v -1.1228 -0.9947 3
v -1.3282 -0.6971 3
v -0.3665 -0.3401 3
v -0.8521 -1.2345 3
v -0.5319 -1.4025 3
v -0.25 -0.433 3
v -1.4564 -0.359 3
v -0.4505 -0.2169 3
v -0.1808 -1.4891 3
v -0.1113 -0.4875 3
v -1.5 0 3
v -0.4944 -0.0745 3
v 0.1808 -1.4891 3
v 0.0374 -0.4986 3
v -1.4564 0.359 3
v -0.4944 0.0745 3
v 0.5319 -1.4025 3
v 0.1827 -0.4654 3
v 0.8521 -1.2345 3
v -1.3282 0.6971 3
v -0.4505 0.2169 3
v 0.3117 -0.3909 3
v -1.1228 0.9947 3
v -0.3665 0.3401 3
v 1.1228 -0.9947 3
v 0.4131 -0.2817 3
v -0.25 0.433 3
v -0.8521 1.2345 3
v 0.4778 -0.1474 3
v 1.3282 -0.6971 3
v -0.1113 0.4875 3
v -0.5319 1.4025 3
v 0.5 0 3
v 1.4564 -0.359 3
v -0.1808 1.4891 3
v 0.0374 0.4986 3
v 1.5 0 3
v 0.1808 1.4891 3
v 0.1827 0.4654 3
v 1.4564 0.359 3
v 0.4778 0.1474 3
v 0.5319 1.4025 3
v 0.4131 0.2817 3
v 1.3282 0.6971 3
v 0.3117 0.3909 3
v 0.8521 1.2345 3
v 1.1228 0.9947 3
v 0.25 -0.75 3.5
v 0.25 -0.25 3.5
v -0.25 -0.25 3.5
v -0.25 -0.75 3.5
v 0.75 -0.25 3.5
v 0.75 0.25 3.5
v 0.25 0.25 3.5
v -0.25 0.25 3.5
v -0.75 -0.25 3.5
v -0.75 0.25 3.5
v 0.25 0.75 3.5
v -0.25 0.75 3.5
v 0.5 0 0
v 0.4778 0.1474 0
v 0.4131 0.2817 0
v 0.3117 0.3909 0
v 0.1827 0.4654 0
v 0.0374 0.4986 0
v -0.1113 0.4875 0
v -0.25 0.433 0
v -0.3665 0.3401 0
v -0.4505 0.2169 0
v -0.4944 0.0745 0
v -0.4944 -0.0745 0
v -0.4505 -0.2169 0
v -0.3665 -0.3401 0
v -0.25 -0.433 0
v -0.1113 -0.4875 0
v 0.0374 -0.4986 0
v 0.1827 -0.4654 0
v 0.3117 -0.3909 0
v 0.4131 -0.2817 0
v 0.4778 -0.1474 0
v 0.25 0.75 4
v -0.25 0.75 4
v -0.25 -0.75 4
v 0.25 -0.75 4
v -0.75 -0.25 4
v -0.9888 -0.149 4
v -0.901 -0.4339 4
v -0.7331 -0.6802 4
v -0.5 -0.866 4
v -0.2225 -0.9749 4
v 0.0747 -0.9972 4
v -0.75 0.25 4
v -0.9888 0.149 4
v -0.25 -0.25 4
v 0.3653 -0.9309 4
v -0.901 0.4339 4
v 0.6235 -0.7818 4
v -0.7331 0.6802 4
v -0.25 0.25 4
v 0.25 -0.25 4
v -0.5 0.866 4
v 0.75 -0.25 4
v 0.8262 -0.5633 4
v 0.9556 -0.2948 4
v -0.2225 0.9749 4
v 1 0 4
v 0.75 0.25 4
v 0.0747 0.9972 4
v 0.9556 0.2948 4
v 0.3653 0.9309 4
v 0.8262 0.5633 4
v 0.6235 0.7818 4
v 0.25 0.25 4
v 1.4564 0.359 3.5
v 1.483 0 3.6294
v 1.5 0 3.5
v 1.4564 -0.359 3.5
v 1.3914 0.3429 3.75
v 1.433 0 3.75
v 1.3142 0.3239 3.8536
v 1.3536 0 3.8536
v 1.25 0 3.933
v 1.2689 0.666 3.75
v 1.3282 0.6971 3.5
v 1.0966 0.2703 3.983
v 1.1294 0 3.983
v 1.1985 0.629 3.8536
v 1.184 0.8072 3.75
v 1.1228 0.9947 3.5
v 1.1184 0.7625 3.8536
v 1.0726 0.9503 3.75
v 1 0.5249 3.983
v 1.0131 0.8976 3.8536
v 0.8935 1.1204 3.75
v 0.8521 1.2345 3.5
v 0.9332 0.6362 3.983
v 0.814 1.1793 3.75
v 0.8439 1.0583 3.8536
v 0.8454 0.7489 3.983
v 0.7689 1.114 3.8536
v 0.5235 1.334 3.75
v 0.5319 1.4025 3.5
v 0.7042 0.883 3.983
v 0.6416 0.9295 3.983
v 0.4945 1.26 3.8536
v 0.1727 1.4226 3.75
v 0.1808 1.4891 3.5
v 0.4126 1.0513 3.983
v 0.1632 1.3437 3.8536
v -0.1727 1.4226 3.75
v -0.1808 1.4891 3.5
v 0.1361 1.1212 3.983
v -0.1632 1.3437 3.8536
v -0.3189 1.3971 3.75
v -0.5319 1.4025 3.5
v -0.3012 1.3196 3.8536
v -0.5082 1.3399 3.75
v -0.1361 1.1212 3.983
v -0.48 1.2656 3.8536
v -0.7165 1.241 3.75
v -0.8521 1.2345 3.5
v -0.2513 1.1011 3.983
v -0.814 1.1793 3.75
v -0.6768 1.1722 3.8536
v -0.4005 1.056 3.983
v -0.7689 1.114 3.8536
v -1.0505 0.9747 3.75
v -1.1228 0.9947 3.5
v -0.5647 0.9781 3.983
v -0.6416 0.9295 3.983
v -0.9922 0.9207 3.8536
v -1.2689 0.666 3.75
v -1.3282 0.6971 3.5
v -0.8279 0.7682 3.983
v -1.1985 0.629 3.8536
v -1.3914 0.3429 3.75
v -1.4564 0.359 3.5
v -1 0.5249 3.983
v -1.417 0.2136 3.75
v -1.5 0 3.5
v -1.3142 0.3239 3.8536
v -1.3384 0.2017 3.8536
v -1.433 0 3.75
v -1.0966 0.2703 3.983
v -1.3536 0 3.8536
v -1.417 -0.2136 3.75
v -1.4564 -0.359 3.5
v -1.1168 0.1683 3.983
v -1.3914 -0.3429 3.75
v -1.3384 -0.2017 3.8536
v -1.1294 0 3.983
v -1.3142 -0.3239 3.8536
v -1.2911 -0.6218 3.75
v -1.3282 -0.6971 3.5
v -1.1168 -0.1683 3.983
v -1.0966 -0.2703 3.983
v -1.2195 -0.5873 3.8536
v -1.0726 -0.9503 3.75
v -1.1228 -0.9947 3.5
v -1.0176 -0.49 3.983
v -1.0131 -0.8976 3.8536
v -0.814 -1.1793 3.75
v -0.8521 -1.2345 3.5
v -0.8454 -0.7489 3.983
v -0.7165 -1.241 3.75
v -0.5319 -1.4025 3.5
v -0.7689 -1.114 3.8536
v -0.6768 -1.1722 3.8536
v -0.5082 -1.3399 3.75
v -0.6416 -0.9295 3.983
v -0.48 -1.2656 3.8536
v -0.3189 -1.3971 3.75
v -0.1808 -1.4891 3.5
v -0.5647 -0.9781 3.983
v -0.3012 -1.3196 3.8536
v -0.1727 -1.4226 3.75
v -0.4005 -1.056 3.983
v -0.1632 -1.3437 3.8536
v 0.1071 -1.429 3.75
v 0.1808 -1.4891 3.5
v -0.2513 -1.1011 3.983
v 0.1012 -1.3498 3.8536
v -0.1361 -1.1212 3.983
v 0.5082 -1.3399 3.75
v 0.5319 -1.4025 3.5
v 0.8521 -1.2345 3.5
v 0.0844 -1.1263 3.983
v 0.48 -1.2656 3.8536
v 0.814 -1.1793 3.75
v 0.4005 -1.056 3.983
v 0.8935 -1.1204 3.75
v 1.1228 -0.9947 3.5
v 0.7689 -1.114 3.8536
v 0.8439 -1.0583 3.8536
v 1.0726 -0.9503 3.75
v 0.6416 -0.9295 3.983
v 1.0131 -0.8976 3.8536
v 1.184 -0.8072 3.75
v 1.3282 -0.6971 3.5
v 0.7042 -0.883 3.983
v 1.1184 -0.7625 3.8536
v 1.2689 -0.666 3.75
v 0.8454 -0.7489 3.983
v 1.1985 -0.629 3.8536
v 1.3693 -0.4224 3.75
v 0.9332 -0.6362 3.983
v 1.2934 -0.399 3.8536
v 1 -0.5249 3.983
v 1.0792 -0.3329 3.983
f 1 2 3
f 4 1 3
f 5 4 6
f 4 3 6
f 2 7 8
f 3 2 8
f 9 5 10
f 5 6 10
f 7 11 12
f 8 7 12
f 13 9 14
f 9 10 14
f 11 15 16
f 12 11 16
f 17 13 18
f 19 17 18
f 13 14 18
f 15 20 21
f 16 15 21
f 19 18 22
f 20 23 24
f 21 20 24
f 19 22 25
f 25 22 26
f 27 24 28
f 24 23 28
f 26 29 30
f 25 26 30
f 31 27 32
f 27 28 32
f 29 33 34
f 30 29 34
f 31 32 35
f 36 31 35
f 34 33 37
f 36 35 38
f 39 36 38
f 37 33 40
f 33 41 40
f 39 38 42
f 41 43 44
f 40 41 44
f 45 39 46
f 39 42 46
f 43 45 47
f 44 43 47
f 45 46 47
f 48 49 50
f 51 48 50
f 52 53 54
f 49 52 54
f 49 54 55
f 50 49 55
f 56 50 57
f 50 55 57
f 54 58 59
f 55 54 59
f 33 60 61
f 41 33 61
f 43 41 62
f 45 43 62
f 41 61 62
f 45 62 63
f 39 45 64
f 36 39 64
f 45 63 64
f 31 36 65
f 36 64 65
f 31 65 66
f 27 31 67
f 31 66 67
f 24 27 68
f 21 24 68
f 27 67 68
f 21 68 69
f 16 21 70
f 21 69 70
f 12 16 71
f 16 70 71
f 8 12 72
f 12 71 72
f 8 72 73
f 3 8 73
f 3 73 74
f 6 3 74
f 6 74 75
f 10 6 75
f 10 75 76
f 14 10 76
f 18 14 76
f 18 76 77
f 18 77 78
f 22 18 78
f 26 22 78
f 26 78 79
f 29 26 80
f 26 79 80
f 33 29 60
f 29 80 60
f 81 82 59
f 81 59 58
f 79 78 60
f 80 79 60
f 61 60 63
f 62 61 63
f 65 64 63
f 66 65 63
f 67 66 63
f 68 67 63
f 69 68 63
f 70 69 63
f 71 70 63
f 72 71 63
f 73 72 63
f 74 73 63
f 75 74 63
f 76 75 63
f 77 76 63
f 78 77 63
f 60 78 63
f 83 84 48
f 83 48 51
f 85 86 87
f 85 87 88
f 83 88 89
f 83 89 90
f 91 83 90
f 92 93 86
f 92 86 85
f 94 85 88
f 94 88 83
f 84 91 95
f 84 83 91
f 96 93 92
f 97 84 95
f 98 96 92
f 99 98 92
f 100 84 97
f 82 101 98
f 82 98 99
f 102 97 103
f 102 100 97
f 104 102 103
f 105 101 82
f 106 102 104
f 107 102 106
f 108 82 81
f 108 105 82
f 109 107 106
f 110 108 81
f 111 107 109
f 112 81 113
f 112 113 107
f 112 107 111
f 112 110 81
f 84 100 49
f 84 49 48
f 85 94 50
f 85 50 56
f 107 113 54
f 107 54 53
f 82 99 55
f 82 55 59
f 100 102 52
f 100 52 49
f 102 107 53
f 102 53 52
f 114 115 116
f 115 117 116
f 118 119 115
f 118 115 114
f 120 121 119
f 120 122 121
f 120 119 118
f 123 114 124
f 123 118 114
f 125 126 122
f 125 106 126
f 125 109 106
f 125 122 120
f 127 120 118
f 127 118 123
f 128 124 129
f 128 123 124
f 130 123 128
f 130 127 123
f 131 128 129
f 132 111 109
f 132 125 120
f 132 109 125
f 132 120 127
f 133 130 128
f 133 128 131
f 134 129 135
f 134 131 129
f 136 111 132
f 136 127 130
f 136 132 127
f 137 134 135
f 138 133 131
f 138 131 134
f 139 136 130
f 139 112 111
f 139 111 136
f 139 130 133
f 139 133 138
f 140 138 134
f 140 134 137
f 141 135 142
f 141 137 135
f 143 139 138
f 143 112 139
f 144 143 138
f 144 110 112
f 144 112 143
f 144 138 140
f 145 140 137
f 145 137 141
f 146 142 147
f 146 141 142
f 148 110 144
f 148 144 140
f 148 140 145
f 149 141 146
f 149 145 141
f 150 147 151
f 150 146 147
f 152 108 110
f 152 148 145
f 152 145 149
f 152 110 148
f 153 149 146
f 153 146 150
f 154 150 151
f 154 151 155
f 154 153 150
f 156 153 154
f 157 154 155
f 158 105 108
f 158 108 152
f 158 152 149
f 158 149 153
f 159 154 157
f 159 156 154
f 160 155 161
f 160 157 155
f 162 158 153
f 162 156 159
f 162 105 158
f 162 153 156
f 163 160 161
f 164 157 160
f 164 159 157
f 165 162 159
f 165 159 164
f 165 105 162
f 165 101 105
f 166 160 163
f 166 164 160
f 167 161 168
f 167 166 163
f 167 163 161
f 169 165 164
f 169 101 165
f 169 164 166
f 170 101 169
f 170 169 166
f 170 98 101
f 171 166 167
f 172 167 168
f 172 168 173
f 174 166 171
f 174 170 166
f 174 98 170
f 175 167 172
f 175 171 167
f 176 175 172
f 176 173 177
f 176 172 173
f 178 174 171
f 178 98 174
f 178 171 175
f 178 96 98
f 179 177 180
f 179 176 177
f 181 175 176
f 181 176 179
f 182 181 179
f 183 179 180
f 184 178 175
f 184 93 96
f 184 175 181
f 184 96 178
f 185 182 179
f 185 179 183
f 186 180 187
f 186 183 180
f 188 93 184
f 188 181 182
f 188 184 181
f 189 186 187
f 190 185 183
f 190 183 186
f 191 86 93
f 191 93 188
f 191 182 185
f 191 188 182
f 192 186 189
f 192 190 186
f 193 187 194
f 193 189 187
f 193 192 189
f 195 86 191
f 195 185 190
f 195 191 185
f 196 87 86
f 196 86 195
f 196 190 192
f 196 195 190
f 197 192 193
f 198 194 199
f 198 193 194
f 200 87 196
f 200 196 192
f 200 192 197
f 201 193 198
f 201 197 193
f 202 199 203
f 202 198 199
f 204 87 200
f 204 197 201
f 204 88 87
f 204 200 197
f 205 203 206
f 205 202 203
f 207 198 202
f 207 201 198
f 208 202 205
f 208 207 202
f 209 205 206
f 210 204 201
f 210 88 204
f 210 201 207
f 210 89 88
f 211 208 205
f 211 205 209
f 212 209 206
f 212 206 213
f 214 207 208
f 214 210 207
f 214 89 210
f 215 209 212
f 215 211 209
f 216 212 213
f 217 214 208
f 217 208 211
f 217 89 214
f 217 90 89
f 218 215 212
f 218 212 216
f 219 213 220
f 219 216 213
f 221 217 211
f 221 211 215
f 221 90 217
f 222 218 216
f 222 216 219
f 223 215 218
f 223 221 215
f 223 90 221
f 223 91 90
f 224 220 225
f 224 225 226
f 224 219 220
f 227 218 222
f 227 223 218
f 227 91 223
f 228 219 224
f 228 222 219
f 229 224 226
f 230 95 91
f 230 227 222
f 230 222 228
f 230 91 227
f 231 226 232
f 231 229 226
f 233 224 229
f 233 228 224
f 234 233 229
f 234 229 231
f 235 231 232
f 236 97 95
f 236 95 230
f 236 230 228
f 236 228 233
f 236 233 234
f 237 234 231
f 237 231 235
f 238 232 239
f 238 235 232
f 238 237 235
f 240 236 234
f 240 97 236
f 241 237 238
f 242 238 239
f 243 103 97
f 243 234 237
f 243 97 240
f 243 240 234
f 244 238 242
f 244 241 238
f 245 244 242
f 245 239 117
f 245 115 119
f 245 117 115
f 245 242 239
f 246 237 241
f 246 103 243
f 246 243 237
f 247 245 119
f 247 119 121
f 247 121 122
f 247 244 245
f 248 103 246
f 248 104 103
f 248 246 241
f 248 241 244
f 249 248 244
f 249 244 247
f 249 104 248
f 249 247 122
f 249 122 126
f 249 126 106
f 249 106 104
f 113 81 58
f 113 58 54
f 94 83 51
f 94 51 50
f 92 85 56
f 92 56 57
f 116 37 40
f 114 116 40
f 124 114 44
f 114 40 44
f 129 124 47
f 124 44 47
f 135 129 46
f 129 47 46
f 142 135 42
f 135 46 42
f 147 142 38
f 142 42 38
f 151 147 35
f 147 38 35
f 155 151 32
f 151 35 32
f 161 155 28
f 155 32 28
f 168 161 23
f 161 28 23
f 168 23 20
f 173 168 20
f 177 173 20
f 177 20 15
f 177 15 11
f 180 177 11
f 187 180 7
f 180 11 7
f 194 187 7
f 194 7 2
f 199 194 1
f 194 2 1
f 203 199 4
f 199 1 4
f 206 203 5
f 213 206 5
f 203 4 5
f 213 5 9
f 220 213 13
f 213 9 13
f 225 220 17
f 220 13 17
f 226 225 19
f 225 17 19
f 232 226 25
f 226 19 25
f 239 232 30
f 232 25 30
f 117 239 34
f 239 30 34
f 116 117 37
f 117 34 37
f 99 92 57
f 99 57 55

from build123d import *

# Parameters (mm, degrees)
SKETCH_1_R          = 0.5
EXTRUDE_1_DEPTH     = 3
SKETCH_2_R          = 1.5
EXTRUDE_2_DEPTH     = 1
FILLET_1_R          = 0.5
CUT_EXTRUDE_1_DEPTH = 0.5


with BuildPart() as part:
    # 草图1 → 凸台-拉伸1 (new body)
    with BuildSketch(Plane.XY):
        Circle(SKETCH_1_R)
    extrude(amount=EXTRUDE_1_DEPTH)

    # 草图2 → 凸台-拉伸2 (add)
    with BuildSketch(Plane.XY.offset(3)):
        Circle(SKETCH_2_R)
    extrude(amount=EXTRUDE_2_DEPTH)

    # 圆角1
    fillet_1_edges = [part.edges().sort_by_distance(p)[0] for p in [
        (-1.5, 0, 4),
    ]]
    fillet(fillet_1_edges, radius=FILLET_1_R)

    # 草图3 → 切除-拉伸1 (cut)
    with BuildSketch(Plane.XY.offset(4)):
        Polygon((-0.75, 0.25), (-0.25, 0.25), (-0.25, 0.75), (0.25, 0.75), (0.25, 0.25), (0.75, 0.25), (0.75, -0.25), (0.25, -0.25), (0.25, -0.75), (-0.25, -0.75), (-0.25, -0.25), (-0.75, -0.25), align=None)
    extrude(amount=-CUT_EXTRUDE_1_DEPTH, mode=Mode.SUBTRACT)


solid = part.part
